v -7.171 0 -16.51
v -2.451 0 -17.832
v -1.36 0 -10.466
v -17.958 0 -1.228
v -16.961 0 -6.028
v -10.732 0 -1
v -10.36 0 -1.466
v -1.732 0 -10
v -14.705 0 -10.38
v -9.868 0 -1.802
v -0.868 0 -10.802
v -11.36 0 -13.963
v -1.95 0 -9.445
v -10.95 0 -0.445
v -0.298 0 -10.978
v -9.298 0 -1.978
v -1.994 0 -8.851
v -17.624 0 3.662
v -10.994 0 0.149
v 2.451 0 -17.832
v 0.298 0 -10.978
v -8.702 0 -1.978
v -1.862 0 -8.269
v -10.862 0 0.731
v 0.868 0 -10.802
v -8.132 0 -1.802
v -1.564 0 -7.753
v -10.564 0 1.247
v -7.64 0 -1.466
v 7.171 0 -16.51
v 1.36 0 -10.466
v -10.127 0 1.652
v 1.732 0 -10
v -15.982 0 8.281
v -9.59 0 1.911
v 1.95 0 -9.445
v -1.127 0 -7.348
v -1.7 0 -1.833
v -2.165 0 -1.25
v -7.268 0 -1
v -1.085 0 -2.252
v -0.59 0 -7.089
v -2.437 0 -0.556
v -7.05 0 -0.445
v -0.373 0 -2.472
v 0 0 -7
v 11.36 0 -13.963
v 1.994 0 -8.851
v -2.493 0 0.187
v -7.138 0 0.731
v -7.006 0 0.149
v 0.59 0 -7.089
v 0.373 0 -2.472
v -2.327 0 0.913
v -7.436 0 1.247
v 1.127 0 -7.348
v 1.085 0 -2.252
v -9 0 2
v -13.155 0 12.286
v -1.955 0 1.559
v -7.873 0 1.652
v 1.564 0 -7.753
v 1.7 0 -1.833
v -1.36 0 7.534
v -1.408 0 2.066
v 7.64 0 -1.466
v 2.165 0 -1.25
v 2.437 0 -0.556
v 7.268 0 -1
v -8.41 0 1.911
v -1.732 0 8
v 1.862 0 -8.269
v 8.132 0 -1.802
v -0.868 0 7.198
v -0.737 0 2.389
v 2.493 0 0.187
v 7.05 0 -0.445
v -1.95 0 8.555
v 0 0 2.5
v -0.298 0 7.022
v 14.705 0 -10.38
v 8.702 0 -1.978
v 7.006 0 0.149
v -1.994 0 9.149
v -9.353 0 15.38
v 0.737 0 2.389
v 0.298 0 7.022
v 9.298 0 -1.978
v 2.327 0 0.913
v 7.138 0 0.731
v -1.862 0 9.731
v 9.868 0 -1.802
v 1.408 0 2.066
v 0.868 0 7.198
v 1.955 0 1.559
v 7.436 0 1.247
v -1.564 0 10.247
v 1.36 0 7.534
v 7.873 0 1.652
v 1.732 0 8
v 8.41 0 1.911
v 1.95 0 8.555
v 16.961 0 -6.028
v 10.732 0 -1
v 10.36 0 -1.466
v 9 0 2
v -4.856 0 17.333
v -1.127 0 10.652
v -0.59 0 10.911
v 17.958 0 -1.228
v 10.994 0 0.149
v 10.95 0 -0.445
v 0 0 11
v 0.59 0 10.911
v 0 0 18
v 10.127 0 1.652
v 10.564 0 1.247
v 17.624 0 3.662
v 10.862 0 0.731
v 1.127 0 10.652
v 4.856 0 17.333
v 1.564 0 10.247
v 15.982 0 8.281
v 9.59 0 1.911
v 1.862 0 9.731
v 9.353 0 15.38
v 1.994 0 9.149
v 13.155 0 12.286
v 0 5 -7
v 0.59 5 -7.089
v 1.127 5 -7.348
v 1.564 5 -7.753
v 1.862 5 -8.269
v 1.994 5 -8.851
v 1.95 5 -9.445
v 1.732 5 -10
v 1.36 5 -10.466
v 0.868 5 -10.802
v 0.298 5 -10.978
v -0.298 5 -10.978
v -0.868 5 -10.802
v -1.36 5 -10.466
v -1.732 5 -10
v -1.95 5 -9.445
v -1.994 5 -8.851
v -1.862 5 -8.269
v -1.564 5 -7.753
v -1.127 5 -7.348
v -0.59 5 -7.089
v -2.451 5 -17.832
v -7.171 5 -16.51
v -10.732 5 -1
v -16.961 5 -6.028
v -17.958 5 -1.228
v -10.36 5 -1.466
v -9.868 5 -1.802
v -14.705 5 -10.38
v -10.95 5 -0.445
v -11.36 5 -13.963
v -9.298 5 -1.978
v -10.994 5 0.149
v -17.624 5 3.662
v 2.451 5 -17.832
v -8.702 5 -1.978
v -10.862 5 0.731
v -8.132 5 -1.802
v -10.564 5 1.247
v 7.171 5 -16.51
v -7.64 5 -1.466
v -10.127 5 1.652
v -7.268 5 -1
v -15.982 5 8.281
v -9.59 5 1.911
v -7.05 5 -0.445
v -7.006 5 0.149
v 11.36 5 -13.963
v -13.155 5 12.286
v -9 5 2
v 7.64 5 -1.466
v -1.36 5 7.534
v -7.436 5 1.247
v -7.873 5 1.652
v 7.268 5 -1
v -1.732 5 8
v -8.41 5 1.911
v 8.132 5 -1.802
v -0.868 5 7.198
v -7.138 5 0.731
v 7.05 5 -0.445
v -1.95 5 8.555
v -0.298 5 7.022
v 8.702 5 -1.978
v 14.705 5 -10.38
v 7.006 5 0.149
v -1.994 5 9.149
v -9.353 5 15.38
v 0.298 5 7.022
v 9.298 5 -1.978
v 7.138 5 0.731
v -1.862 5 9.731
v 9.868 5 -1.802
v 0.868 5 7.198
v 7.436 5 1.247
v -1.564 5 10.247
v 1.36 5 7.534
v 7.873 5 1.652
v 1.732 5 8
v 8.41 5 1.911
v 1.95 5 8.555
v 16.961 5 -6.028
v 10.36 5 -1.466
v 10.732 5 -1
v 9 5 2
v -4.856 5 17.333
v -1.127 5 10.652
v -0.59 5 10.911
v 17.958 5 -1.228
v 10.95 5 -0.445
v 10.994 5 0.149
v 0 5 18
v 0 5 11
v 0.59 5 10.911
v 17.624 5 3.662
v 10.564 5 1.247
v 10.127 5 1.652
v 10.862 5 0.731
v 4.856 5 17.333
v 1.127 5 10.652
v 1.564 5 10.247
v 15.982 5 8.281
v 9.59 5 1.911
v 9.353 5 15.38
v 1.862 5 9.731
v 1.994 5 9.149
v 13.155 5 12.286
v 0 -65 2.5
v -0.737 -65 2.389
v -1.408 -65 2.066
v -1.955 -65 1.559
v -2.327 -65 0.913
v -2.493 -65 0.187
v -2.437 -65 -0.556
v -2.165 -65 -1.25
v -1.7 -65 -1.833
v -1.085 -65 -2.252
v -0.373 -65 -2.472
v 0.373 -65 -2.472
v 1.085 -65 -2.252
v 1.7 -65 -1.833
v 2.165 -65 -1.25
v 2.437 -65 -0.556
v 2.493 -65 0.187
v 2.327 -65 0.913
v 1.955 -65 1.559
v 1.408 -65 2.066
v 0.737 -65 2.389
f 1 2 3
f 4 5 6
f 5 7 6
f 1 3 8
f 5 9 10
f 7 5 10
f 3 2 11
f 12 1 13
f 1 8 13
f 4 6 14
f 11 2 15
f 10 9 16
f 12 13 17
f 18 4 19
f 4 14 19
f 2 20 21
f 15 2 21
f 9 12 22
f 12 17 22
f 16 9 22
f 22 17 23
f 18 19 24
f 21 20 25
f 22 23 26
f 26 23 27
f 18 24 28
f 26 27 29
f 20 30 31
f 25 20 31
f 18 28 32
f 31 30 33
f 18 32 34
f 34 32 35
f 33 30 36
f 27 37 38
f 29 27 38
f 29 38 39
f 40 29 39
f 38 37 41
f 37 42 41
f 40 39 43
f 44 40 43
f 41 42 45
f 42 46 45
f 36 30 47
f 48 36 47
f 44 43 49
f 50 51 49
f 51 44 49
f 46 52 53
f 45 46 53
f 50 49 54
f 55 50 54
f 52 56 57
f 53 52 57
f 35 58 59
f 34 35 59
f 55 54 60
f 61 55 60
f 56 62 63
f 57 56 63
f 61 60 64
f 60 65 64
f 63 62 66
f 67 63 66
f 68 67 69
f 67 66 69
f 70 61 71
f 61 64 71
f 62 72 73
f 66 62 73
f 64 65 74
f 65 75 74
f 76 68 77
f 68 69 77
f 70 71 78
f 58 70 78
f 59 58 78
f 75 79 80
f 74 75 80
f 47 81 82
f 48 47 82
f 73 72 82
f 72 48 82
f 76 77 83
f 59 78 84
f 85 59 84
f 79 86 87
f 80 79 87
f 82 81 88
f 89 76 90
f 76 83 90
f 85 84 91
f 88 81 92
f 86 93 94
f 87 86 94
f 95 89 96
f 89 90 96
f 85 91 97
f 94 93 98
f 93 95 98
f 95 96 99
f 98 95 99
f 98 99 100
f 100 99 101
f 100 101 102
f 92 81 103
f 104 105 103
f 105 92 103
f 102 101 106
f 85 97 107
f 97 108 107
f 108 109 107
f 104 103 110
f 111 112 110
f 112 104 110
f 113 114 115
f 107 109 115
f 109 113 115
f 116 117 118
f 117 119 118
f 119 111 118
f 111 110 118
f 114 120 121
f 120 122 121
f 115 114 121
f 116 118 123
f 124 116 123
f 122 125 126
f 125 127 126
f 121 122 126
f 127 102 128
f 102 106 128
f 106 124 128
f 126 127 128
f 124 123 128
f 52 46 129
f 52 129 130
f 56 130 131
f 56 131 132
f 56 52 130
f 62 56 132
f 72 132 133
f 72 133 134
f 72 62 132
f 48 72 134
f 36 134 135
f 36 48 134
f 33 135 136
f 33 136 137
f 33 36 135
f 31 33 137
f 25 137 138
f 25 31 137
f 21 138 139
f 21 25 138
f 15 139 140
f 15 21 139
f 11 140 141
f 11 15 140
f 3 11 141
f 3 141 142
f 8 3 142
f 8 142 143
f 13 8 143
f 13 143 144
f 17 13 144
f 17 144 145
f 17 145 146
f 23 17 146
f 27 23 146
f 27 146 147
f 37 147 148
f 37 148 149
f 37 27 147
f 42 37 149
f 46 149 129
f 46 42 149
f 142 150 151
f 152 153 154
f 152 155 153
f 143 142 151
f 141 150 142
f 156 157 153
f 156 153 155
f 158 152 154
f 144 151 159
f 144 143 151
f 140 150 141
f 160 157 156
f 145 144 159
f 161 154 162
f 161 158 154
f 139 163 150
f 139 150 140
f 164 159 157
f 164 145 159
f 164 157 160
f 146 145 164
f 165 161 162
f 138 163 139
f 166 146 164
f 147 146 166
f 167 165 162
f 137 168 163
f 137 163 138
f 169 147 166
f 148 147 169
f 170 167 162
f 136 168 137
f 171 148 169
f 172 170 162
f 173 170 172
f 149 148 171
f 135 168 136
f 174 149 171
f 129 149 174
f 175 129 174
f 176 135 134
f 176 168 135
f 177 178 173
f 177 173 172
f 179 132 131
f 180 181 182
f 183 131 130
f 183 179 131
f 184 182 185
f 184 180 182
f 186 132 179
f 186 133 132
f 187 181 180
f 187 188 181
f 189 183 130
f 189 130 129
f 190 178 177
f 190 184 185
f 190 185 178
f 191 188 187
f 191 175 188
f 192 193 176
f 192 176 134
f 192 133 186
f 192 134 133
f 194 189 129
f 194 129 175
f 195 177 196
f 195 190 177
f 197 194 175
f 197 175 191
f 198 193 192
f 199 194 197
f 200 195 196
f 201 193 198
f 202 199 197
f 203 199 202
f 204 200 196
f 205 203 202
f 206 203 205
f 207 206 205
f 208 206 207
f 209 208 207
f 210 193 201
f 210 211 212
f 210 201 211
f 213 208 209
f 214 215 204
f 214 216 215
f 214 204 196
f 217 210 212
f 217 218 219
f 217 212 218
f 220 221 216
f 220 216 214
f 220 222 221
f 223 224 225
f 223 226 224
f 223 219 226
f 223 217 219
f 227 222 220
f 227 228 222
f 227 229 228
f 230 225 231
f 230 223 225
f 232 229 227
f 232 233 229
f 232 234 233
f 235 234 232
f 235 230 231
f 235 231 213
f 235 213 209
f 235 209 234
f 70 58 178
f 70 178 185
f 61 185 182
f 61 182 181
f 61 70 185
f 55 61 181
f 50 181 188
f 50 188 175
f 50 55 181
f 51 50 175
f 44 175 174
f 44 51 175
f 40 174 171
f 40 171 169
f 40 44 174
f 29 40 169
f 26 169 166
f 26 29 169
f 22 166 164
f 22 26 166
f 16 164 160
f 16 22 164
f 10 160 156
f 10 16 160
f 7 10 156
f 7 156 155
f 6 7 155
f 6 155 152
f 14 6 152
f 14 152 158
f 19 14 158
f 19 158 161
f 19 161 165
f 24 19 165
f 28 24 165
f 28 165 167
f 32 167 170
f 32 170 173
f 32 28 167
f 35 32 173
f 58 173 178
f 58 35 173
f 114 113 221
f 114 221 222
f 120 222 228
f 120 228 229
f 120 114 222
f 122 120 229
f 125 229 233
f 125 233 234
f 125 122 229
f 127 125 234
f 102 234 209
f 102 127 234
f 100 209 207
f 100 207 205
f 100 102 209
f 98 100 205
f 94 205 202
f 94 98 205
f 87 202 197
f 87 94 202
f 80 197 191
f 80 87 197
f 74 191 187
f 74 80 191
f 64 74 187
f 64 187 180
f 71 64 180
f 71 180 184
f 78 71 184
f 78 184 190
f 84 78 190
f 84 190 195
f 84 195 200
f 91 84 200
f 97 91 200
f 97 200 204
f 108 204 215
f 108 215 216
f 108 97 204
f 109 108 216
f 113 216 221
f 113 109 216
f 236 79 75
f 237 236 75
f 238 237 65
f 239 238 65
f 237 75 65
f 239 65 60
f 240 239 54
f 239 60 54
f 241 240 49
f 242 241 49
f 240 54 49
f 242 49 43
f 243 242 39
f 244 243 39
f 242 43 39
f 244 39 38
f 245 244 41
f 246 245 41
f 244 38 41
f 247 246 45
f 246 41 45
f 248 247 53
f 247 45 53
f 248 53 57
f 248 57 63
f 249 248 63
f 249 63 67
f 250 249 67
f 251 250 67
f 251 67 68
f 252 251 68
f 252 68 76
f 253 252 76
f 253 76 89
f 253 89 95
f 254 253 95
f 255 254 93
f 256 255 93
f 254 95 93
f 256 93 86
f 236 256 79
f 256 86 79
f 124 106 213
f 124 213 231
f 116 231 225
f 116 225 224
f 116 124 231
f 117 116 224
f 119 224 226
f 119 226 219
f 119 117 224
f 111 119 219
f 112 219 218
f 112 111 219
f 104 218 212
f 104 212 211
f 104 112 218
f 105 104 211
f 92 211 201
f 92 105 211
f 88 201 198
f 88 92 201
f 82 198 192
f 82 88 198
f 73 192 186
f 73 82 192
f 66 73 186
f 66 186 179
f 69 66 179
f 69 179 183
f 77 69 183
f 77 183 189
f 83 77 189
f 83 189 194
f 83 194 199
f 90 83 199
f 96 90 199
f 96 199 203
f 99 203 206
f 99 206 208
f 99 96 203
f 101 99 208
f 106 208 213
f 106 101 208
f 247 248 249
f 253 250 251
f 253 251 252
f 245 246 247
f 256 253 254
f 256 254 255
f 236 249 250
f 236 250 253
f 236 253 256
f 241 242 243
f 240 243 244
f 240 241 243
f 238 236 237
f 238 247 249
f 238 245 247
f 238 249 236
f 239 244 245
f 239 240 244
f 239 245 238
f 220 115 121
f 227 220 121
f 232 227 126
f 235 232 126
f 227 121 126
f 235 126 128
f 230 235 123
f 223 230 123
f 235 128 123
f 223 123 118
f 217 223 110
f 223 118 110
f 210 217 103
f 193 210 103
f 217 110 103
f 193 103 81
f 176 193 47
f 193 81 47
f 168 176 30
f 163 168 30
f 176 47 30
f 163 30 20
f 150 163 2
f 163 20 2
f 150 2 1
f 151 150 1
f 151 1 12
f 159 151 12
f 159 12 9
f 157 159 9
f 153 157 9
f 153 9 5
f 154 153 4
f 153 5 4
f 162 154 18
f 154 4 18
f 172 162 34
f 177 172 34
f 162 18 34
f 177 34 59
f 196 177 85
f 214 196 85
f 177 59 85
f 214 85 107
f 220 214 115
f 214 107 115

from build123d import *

# Parameters (mm, degrees)
SKETCH_1_R      = 18
SKETCH_1_R_2    = 2
EXTRUDE_1_DEPTH = 5
SKETCH_2_R      = 2.5
EXTRUDE_2_DEPTH = 65


with BuildPart() as part:
    # 草图1 → 凸台-拉伸1 (new body)
    with BuildSketch(Plane(origin=(0, 0, 0), x_dir=(1, 0, 0), z_dir=(0, 1, 0))):
        with Locations(Location((0, 0, 0), (0, 0, 270))):
            Circle(SKETCH_1_R)
        with Locations(Location((0, 9, 0), (0, 0, 270))):
            Circle(SKETCH_1_R_2, mode=Mode.SUBTRACT)
        with Locations(Location((9, 0, 0), (0, 0, 270))):
            Circle(SKETCH_1_R_2, mode=Mode.SUBTRACT)
        with Locations(Location((-9, 0, 0), (0, 0, 270))):
            Circle(SKETCH_1_R_2, mode=Mode.SUBTRACT)
        with Locations(Location((0, -9, 0), (0, 0, 270))):
            Circle(SKETCH_1_R_2, mode=Mode.SUBTRACT)
    extrude(amount=EXTRUDE_1_DEPTH)

    # 草图2 → 凸台-拉伸2 (add)
    with BuildSketch(Plane.XZ):
        with Locations(Location((0, 0, 0), (0, 0, 90))):
            Circle(SKETCH_2_R)
    extrude(amount=EXTRUDE_2_DEPTH)


solid = part.part
